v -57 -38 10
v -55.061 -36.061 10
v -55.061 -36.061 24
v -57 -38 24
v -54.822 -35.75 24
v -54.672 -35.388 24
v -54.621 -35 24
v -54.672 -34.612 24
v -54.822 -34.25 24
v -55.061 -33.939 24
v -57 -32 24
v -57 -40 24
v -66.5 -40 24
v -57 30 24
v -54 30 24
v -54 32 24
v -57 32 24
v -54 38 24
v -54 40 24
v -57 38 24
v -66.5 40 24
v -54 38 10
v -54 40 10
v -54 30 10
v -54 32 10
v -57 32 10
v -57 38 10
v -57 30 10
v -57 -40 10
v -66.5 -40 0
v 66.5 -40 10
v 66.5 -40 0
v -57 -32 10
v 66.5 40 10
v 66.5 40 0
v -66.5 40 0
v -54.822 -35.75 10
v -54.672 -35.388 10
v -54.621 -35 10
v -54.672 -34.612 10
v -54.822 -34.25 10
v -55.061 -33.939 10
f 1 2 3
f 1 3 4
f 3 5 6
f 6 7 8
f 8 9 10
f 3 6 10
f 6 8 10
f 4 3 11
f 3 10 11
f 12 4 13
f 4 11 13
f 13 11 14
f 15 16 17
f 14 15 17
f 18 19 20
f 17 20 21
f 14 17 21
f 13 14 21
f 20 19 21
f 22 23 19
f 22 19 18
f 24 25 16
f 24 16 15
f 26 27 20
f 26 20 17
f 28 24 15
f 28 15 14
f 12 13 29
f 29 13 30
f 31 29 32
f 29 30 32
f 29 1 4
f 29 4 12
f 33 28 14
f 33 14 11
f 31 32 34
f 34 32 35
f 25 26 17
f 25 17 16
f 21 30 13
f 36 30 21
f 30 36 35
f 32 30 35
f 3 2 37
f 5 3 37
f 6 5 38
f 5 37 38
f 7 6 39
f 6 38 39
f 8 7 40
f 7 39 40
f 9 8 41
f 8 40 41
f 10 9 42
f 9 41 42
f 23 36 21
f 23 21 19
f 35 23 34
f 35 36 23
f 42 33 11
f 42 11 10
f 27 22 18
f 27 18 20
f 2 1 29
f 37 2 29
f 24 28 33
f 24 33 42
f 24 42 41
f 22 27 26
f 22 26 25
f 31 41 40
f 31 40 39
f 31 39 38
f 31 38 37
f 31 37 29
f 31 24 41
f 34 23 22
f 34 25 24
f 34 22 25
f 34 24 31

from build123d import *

# Parameters (mm, degrees)
SKETCH_W     = 133
SKETCH_H     = 80
PAD_DEPTH    = 10
PAD001_DEPTH = 24


with BuildPart() as part:
    # Sketch → Pad (new body)
    with BuildSketch(Plane.XY):
        Rectangle(SKETCH_W, SKETCH_H)
    extrude(amount=PAD_DEPTH)

    # Sketch001 → Pad001 (join)
    with BuildSketch(Plane.XY):
        with BuildLine():
            Line((-66.5, -40), (-66.5, 40))
            Line((-66.5, 40), (-54, 40))
            Line((-54, 40), (-54, 38))
            Line((-54, 38), (-57, 38))
            Line((-57, 38), (-57, 32))
            Line((-57, 32), (-54, 32))
            Line((-54, 32), (-54, 30))
            Line((-54, 30), (-57, 30))
            Line((-57, 30), (-57, -32))
            Line((-57, -32), (-55.06066, -33.93934))
            ThreePointArc((-55.06066, -36.06066), (-54.62132, -35), (-55.06066, -33.93934))
            Line((-55.06066, -36.06066), (-57, -38))
            Line((-57, -38), (-57, -40))
            Line((-57, -40), (-66.5, -40))
        make_face()
    extrude(amount=PAD001_DEPTH)


solid = part.part
